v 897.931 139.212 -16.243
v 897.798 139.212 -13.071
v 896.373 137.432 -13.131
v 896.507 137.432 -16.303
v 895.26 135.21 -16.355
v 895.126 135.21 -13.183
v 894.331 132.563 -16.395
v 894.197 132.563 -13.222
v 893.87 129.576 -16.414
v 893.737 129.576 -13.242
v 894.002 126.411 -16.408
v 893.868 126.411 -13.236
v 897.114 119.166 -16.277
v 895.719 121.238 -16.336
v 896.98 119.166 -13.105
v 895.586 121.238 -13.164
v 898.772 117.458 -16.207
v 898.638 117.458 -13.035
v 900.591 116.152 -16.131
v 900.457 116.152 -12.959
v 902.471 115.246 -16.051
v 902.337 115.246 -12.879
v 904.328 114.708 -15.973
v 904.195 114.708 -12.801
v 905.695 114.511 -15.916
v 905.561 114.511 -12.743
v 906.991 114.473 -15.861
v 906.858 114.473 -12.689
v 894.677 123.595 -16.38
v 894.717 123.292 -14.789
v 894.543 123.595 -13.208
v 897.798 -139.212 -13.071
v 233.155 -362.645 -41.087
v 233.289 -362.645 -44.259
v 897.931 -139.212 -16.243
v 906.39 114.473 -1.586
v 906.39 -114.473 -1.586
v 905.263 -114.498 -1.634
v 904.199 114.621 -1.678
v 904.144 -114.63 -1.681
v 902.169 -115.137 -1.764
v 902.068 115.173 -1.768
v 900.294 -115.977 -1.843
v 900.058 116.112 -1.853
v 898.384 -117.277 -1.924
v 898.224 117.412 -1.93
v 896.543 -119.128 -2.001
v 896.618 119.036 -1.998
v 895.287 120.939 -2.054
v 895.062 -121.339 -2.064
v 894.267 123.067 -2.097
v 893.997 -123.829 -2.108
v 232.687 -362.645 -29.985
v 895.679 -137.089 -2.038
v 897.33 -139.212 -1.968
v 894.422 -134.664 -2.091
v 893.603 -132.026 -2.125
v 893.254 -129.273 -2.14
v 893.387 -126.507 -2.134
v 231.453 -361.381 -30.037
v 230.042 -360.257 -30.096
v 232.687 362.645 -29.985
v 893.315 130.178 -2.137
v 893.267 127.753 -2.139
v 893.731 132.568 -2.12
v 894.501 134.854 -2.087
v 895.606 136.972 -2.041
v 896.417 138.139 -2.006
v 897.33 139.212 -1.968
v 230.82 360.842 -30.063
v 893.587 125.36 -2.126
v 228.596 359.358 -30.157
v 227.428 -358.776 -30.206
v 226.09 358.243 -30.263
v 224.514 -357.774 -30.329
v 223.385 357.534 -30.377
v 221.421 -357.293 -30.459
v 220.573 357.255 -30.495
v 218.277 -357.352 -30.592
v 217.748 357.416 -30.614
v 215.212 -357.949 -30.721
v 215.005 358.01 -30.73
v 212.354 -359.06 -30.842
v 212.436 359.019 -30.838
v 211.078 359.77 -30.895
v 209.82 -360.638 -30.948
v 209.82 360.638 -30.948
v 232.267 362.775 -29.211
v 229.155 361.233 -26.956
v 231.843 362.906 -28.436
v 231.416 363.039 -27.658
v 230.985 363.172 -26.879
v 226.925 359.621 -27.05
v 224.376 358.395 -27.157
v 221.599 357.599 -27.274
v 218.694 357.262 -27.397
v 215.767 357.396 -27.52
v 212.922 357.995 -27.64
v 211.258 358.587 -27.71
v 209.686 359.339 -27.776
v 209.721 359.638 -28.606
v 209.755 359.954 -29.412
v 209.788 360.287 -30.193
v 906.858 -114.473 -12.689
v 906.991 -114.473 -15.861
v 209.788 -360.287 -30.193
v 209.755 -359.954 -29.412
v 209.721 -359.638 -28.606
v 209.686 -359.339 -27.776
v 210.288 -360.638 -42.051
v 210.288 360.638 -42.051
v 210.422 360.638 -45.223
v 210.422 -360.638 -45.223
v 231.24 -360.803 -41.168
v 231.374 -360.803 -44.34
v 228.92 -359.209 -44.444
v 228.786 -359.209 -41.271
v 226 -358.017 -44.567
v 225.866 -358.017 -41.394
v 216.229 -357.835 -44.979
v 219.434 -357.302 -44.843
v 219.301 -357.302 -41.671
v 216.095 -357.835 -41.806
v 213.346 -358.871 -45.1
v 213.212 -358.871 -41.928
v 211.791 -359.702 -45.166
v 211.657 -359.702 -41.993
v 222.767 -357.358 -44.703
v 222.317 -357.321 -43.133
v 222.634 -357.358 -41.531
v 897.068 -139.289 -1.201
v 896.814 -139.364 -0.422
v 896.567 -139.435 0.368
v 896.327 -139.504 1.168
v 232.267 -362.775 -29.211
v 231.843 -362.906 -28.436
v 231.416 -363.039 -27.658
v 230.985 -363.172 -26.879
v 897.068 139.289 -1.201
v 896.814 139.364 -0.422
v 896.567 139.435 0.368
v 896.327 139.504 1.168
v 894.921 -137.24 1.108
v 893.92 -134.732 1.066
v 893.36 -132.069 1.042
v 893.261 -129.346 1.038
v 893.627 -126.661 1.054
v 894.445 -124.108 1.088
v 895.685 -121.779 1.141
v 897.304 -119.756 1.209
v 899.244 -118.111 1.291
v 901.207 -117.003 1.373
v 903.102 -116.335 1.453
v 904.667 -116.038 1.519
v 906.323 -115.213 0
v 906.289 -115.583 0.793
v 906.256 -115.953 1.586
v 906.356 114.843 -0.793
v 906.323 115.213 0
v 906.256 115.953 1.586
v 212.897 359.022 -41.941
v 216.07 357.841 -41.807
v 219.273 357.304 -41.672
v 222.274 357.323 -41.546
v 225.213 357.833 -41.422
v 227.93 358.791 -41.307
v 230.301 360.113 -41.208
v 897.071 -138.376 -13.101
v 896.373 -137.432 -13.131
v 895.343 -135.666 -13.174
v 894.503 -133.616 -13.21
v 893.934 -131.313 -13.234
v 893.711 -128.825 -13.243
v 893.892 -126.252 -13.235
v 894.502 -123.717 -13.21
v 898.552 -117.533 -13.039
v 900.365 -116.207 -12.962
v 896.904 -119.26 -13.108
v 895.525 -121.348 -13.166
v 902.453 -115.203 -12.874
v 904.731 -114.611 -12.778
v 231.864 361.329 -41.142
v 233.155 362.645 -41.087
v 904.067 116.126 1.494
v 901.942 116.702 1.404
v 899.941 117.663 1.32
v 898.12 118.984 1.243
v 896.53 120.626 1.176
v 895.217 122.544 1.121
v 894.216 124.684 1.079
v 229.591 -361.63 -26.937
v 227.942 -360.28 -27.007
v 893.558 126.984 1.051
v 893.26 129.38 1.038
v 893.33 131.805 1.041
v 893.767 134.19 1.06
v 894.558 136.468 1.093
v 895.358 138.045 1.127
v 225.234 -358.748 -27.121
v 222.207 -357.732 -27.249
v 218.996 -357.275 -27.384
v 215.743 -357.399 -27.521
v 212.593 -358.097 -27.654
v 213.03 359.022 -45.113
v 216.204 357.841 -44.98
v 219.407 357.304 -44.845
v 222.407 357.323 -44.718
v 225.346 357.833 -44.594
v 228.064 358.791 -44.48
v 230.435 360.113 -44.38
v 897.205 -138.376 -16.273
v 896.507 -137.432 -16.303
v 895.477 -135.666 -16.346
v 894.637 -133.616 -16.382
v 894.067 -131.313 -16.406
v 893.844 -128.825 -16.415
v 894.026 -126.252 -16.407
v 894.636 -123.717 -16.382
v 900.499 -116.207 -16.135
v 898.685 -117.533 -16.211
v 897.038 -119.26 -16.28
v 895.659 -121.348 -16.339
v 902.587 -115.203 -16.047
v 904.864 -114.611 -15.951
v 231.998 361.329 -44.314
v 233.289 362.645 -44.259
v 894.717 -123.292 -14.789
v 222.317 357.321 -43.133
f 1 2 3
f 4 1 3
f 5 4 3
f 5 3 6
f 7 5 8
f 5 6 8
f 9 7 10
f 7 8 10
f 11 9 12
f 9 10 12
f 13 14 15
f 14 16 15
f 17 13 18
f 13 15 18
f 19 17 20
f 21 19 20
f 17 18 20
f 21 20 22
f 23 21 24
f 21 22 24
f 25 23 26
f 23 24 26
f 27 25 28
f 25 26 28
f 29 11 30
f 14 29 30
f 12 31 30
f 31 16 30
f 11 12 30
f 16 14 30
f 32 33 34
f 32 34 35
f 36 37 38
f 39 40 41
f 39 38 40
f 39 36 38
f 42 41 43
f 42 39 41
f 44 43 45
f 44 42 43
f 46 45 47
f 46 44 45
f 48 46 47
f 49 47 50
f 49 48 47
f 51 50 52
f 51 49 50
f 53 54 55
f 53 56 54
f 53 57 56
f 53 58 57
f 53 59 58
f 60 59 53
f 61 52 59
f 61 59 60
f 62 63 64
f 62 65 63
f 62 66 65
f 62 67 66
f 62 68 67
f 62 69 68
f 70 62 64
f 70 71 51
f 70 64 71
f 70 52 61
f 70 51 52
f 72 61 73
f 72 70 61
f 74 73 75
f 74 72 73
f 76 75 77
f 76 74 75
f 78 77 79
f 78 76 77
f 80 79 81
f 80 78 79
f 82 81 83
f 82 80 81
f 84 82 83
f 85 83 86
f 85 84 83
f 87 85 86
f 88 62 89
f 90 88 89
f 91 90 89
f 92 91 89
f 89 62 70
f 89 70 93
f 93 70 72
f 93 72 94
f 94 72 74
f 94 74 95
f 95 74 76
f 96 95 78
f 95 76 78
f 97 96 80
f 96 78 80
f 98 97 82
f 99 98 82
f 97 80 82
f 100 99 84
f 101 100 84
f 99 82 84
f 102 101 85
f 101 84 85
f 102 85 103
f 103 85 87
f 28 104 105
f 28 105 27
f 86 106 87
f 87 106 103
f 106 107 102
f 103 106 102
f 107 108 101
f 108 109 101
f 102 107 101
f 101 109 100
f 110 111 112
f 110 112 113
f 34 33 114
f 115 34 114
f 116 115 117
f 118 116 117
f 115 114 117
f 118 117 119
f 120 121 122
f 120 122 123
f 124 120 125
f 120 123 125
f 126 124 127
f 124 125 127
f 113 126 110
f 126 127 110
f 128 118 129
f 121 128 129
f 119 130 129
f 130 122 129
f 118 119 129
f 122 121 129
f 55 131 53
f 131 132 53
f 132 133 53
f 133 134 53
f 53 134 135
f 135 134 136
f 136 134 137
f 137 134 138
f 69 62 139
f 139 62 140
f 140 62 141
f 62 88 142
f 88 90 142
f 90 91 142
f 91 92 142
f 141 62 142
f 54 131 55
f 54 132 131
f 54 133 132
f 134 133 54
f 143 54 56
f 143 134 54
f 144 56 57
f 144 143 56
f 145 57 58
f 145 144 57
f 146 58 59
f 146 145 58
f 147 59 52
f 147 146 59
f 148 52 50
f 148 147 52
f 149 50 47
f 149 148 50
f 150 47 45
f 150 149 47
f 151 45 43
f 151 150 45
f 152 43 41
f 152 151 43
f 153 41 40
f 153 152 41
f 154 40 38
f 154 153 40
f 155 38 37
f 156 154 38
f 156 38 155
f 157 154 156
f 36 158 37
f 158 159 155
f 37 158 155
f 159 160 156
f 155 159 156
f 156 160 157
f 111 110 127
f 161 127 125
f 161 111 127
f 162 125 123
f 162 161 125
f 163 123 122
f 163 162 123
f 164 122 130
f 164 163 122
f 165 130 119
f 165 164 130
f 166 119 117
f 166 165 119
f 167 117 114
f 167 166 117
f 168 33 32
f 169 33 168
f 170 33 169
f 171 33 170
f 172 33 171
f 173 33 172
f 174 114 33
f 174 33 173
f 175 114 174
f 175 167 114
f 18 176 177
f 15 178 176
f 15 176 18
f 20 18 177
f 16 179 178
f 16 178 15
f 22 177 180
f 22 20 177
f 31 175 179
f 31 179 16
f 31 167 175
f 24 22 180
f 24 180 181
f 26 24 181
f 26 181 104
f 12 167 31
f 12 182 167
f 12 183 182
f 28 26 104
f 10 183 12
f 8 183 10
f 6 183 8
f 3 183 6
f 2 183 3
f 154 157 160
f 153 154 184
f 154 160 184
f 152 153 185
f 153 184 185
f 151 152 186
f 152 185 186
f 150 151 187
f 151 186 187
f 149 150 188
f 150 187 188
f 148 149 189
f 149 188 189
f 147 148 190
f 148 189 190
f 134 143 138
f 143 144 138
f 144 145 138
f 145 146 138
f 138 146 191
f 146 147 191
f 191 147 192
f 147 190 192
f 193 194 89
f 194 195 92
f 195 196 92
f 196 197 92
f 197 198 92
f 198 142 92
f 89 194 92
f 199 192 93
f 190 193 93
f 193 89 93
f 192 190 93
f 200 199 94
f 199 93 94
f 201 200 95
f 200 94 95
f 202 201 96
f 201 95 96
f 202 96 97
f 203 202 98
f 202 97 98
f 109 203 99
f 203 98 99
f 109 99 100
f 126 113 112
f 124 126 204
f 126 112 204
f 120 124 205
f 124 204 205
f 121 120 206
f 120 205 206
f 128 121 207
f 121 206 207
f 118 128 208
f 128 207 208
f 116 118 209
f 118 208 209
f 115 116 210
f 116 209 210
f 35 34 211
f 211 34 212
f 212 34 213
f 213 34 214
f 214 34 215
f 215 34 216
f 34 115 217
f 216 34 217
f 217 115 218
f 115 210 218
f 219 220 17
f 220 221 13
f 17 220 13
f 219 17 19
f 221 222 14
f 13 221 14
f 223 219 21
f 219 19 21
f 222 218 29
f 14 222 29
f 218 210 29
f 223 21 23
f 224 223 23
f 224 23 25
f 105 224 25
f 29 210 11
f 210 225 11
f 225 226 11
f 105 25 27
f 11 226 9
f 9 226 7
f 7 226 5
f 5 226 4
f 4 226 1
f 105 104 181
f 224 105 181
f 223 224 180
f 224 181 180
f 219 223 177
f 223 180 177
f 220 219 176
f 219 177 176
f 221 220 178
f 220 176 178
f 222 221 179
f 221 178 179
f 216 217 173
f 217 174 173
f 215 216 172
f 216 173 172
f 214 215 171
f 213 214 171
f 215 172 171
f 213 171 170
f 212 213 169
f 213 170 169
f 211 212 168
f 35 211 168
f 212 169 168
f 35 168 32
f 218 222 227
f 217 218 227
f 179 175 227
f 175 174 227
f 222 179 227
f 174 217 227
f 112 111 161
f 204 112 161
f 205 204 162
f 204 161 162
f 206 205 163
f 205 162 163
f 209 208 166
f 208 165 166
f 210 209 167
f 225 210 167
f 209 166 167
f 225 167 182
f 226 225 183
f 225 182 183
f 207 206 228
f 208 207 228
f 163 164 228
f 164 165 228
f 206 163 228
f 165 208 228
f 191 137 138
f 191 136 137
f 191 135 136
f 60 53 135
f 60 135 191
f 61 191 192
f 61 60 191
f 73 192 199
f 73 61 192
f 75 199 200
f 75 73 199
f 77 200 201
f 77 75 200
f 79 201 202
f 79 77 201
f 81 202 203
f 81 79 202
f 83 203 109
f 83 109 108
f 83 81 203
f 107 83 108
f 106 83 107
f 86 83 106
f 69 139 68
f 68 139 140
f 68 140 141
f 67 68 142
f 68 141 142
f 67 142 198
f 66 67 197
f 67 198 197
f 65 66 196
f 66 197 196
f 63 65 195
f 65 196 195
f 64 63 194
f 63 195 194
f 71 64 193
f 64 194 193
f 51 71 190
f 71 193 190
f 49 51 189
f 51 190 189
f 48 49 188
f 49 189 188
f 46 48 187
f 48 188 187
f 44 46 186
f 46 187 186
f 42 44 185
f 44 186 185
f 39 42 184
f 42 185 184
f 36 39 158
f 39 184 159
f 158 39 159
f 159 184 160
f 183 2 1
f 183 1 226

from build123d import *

# Parameters (mm, degrees)
BOSS_EXTRUDE1_DEPTH = 1.5875
SKETCH2_R           = 13.081
CUT_EXTRUDE1_DEPTH  = 901.16952554
SKETCH3_R           = 13.081
CUT_EXTRUDE2_DEPTH  = 1194.175059072
BOSS_EXTRUDE2_DEPTH = 3.175


with BuildPart() as part:
    # Sketch1 → Boss-Extrude1 (new, symmetric)
    with BuildSketch(Plane(origin=(1.607555501, 0, -38.136333964), x_dir=(0.9991127504631488, 0, 0.04211545870534549), z_dir=(-0.04211545870534549, 0, 0.999112750463149))):
        Polygon((208.330485626, 370.332), (905.518665515, 136.166603714), (905.518665515, -136.166603714), (208.330485626, -370.332), align=None)
    extrude(amount=BOSS_EXTRUDE1_DEPTH, both=True)

    # Sketch2 → Cut-Extrude1 (cut, through all)
    with BuildSketch(Plane(origin=(906.3228, 181.675109228, 111.497888082), x_dir=(1, 0, 0), z_dir=(0, 0.4228510617538768, 0.9061991942026981))):
        Circle(SKETCH2_R)
    cut_extrude1 = extrude(amount=-CUT_EXTRUDE1_DEPTH, mode=Mode.SUBTRACT)

    # Mirror1: Cut-Extrude1 across plane
    add(cut_extrude1.mirror(Plane.ZX), mode=Mode.SUBTRACT)

    # Sketch3 → Cut-Extrude2 (cut, symmetric)
    with BuildSketch(Plane(origin=(18.074015753, 370.332, 262.27306283), x_dir=(-0.8229553854788443, 0, -0.56810600552306), z_dir=(0.56810600552306, 0, -0.8229553854788443))):
        Circle(SKETCH3_R)
    cut_extrude2 = extrude(amount=CUT_EXTRUDE2_DEPTH, both=True, mode=Mode.SUBTRACT)

    # Mirror2: Cut-Extrude2 across plane
    add(cut_extrude2.mirror(Plane.ZX), mode=Mode.SUBTRACT)


with BuildPart() as body_2:
    # Sketch4 → Boss-Extrude2 (new body)
    with BuildSketch(Plane(origin=(2.142421827, 0, -50.825065895), x_dir=(0.9991127504631488, 0, 0.04211545870534549), z_dir=(-0.04211545870534549, 0, 0.999112750463149))):
        with BuildLine():
            Line((208.330485626, 360.637647396), (208.330485626, -360.637647396))
            add(Edge.make_bspline(
                [(231.218068965, -362.644721045), (221.095702884, -350.852329213), (208.330485626, -360.637647396)],
                knots=[3.769765679, 3.769765679, 3.769765679, 5.44847537, 5.44847537, 5.44847537], degree=2, weights=[1, 0.667943097, 1]))
            Line((231.218068965, -362.644721045), (896.450733287, -139.212260547))
            add(Edge.make_bspline(
                [(905.518665515, -114.472985943), (872.399197719, -113.635488894), (896.450733287, -139.212260547)],
                knots=[3.037122544, 3.037122544, 3.037122544, 5.425802301, 5.425802301, 5.425802301], degree=2, weights=[1, 0.367627377, 1]))
            Line((905.518665515, -114.472985943), (905.518665515, 114.472985943))
            add(Edge.make_bspline(
                [(896.450733287, 139.212260547), (872.399197719, 113.635488894), (905.518665515, 114.472985943)],
                knots=[0.857383007, 0.857383007, 0.857383007, 3.246062763, 3.246062763, 3.246062763], degree=2, weights=[1, 0.367627377, 1]))
            Line((896.450733287, 139.212260547), (231.218068965, 362.644721045))
            add(Edge.make_bspline(
                [(208.330485626, 360.637647396), (221.095702884, 350.852329213), (231.218068965, 362.644721045)],
                knots=[0.834709937, 0.834709937, 0.834709937, 2.513419628, 2.513419628, 2.513419628], degree=2, weights=[1, 0.667943097, 1]))
        make_face()
    extrude(amount=-BOSS_EXTRUDE2_DEPTH)


solid = Compound([part.part, body_2.part])
